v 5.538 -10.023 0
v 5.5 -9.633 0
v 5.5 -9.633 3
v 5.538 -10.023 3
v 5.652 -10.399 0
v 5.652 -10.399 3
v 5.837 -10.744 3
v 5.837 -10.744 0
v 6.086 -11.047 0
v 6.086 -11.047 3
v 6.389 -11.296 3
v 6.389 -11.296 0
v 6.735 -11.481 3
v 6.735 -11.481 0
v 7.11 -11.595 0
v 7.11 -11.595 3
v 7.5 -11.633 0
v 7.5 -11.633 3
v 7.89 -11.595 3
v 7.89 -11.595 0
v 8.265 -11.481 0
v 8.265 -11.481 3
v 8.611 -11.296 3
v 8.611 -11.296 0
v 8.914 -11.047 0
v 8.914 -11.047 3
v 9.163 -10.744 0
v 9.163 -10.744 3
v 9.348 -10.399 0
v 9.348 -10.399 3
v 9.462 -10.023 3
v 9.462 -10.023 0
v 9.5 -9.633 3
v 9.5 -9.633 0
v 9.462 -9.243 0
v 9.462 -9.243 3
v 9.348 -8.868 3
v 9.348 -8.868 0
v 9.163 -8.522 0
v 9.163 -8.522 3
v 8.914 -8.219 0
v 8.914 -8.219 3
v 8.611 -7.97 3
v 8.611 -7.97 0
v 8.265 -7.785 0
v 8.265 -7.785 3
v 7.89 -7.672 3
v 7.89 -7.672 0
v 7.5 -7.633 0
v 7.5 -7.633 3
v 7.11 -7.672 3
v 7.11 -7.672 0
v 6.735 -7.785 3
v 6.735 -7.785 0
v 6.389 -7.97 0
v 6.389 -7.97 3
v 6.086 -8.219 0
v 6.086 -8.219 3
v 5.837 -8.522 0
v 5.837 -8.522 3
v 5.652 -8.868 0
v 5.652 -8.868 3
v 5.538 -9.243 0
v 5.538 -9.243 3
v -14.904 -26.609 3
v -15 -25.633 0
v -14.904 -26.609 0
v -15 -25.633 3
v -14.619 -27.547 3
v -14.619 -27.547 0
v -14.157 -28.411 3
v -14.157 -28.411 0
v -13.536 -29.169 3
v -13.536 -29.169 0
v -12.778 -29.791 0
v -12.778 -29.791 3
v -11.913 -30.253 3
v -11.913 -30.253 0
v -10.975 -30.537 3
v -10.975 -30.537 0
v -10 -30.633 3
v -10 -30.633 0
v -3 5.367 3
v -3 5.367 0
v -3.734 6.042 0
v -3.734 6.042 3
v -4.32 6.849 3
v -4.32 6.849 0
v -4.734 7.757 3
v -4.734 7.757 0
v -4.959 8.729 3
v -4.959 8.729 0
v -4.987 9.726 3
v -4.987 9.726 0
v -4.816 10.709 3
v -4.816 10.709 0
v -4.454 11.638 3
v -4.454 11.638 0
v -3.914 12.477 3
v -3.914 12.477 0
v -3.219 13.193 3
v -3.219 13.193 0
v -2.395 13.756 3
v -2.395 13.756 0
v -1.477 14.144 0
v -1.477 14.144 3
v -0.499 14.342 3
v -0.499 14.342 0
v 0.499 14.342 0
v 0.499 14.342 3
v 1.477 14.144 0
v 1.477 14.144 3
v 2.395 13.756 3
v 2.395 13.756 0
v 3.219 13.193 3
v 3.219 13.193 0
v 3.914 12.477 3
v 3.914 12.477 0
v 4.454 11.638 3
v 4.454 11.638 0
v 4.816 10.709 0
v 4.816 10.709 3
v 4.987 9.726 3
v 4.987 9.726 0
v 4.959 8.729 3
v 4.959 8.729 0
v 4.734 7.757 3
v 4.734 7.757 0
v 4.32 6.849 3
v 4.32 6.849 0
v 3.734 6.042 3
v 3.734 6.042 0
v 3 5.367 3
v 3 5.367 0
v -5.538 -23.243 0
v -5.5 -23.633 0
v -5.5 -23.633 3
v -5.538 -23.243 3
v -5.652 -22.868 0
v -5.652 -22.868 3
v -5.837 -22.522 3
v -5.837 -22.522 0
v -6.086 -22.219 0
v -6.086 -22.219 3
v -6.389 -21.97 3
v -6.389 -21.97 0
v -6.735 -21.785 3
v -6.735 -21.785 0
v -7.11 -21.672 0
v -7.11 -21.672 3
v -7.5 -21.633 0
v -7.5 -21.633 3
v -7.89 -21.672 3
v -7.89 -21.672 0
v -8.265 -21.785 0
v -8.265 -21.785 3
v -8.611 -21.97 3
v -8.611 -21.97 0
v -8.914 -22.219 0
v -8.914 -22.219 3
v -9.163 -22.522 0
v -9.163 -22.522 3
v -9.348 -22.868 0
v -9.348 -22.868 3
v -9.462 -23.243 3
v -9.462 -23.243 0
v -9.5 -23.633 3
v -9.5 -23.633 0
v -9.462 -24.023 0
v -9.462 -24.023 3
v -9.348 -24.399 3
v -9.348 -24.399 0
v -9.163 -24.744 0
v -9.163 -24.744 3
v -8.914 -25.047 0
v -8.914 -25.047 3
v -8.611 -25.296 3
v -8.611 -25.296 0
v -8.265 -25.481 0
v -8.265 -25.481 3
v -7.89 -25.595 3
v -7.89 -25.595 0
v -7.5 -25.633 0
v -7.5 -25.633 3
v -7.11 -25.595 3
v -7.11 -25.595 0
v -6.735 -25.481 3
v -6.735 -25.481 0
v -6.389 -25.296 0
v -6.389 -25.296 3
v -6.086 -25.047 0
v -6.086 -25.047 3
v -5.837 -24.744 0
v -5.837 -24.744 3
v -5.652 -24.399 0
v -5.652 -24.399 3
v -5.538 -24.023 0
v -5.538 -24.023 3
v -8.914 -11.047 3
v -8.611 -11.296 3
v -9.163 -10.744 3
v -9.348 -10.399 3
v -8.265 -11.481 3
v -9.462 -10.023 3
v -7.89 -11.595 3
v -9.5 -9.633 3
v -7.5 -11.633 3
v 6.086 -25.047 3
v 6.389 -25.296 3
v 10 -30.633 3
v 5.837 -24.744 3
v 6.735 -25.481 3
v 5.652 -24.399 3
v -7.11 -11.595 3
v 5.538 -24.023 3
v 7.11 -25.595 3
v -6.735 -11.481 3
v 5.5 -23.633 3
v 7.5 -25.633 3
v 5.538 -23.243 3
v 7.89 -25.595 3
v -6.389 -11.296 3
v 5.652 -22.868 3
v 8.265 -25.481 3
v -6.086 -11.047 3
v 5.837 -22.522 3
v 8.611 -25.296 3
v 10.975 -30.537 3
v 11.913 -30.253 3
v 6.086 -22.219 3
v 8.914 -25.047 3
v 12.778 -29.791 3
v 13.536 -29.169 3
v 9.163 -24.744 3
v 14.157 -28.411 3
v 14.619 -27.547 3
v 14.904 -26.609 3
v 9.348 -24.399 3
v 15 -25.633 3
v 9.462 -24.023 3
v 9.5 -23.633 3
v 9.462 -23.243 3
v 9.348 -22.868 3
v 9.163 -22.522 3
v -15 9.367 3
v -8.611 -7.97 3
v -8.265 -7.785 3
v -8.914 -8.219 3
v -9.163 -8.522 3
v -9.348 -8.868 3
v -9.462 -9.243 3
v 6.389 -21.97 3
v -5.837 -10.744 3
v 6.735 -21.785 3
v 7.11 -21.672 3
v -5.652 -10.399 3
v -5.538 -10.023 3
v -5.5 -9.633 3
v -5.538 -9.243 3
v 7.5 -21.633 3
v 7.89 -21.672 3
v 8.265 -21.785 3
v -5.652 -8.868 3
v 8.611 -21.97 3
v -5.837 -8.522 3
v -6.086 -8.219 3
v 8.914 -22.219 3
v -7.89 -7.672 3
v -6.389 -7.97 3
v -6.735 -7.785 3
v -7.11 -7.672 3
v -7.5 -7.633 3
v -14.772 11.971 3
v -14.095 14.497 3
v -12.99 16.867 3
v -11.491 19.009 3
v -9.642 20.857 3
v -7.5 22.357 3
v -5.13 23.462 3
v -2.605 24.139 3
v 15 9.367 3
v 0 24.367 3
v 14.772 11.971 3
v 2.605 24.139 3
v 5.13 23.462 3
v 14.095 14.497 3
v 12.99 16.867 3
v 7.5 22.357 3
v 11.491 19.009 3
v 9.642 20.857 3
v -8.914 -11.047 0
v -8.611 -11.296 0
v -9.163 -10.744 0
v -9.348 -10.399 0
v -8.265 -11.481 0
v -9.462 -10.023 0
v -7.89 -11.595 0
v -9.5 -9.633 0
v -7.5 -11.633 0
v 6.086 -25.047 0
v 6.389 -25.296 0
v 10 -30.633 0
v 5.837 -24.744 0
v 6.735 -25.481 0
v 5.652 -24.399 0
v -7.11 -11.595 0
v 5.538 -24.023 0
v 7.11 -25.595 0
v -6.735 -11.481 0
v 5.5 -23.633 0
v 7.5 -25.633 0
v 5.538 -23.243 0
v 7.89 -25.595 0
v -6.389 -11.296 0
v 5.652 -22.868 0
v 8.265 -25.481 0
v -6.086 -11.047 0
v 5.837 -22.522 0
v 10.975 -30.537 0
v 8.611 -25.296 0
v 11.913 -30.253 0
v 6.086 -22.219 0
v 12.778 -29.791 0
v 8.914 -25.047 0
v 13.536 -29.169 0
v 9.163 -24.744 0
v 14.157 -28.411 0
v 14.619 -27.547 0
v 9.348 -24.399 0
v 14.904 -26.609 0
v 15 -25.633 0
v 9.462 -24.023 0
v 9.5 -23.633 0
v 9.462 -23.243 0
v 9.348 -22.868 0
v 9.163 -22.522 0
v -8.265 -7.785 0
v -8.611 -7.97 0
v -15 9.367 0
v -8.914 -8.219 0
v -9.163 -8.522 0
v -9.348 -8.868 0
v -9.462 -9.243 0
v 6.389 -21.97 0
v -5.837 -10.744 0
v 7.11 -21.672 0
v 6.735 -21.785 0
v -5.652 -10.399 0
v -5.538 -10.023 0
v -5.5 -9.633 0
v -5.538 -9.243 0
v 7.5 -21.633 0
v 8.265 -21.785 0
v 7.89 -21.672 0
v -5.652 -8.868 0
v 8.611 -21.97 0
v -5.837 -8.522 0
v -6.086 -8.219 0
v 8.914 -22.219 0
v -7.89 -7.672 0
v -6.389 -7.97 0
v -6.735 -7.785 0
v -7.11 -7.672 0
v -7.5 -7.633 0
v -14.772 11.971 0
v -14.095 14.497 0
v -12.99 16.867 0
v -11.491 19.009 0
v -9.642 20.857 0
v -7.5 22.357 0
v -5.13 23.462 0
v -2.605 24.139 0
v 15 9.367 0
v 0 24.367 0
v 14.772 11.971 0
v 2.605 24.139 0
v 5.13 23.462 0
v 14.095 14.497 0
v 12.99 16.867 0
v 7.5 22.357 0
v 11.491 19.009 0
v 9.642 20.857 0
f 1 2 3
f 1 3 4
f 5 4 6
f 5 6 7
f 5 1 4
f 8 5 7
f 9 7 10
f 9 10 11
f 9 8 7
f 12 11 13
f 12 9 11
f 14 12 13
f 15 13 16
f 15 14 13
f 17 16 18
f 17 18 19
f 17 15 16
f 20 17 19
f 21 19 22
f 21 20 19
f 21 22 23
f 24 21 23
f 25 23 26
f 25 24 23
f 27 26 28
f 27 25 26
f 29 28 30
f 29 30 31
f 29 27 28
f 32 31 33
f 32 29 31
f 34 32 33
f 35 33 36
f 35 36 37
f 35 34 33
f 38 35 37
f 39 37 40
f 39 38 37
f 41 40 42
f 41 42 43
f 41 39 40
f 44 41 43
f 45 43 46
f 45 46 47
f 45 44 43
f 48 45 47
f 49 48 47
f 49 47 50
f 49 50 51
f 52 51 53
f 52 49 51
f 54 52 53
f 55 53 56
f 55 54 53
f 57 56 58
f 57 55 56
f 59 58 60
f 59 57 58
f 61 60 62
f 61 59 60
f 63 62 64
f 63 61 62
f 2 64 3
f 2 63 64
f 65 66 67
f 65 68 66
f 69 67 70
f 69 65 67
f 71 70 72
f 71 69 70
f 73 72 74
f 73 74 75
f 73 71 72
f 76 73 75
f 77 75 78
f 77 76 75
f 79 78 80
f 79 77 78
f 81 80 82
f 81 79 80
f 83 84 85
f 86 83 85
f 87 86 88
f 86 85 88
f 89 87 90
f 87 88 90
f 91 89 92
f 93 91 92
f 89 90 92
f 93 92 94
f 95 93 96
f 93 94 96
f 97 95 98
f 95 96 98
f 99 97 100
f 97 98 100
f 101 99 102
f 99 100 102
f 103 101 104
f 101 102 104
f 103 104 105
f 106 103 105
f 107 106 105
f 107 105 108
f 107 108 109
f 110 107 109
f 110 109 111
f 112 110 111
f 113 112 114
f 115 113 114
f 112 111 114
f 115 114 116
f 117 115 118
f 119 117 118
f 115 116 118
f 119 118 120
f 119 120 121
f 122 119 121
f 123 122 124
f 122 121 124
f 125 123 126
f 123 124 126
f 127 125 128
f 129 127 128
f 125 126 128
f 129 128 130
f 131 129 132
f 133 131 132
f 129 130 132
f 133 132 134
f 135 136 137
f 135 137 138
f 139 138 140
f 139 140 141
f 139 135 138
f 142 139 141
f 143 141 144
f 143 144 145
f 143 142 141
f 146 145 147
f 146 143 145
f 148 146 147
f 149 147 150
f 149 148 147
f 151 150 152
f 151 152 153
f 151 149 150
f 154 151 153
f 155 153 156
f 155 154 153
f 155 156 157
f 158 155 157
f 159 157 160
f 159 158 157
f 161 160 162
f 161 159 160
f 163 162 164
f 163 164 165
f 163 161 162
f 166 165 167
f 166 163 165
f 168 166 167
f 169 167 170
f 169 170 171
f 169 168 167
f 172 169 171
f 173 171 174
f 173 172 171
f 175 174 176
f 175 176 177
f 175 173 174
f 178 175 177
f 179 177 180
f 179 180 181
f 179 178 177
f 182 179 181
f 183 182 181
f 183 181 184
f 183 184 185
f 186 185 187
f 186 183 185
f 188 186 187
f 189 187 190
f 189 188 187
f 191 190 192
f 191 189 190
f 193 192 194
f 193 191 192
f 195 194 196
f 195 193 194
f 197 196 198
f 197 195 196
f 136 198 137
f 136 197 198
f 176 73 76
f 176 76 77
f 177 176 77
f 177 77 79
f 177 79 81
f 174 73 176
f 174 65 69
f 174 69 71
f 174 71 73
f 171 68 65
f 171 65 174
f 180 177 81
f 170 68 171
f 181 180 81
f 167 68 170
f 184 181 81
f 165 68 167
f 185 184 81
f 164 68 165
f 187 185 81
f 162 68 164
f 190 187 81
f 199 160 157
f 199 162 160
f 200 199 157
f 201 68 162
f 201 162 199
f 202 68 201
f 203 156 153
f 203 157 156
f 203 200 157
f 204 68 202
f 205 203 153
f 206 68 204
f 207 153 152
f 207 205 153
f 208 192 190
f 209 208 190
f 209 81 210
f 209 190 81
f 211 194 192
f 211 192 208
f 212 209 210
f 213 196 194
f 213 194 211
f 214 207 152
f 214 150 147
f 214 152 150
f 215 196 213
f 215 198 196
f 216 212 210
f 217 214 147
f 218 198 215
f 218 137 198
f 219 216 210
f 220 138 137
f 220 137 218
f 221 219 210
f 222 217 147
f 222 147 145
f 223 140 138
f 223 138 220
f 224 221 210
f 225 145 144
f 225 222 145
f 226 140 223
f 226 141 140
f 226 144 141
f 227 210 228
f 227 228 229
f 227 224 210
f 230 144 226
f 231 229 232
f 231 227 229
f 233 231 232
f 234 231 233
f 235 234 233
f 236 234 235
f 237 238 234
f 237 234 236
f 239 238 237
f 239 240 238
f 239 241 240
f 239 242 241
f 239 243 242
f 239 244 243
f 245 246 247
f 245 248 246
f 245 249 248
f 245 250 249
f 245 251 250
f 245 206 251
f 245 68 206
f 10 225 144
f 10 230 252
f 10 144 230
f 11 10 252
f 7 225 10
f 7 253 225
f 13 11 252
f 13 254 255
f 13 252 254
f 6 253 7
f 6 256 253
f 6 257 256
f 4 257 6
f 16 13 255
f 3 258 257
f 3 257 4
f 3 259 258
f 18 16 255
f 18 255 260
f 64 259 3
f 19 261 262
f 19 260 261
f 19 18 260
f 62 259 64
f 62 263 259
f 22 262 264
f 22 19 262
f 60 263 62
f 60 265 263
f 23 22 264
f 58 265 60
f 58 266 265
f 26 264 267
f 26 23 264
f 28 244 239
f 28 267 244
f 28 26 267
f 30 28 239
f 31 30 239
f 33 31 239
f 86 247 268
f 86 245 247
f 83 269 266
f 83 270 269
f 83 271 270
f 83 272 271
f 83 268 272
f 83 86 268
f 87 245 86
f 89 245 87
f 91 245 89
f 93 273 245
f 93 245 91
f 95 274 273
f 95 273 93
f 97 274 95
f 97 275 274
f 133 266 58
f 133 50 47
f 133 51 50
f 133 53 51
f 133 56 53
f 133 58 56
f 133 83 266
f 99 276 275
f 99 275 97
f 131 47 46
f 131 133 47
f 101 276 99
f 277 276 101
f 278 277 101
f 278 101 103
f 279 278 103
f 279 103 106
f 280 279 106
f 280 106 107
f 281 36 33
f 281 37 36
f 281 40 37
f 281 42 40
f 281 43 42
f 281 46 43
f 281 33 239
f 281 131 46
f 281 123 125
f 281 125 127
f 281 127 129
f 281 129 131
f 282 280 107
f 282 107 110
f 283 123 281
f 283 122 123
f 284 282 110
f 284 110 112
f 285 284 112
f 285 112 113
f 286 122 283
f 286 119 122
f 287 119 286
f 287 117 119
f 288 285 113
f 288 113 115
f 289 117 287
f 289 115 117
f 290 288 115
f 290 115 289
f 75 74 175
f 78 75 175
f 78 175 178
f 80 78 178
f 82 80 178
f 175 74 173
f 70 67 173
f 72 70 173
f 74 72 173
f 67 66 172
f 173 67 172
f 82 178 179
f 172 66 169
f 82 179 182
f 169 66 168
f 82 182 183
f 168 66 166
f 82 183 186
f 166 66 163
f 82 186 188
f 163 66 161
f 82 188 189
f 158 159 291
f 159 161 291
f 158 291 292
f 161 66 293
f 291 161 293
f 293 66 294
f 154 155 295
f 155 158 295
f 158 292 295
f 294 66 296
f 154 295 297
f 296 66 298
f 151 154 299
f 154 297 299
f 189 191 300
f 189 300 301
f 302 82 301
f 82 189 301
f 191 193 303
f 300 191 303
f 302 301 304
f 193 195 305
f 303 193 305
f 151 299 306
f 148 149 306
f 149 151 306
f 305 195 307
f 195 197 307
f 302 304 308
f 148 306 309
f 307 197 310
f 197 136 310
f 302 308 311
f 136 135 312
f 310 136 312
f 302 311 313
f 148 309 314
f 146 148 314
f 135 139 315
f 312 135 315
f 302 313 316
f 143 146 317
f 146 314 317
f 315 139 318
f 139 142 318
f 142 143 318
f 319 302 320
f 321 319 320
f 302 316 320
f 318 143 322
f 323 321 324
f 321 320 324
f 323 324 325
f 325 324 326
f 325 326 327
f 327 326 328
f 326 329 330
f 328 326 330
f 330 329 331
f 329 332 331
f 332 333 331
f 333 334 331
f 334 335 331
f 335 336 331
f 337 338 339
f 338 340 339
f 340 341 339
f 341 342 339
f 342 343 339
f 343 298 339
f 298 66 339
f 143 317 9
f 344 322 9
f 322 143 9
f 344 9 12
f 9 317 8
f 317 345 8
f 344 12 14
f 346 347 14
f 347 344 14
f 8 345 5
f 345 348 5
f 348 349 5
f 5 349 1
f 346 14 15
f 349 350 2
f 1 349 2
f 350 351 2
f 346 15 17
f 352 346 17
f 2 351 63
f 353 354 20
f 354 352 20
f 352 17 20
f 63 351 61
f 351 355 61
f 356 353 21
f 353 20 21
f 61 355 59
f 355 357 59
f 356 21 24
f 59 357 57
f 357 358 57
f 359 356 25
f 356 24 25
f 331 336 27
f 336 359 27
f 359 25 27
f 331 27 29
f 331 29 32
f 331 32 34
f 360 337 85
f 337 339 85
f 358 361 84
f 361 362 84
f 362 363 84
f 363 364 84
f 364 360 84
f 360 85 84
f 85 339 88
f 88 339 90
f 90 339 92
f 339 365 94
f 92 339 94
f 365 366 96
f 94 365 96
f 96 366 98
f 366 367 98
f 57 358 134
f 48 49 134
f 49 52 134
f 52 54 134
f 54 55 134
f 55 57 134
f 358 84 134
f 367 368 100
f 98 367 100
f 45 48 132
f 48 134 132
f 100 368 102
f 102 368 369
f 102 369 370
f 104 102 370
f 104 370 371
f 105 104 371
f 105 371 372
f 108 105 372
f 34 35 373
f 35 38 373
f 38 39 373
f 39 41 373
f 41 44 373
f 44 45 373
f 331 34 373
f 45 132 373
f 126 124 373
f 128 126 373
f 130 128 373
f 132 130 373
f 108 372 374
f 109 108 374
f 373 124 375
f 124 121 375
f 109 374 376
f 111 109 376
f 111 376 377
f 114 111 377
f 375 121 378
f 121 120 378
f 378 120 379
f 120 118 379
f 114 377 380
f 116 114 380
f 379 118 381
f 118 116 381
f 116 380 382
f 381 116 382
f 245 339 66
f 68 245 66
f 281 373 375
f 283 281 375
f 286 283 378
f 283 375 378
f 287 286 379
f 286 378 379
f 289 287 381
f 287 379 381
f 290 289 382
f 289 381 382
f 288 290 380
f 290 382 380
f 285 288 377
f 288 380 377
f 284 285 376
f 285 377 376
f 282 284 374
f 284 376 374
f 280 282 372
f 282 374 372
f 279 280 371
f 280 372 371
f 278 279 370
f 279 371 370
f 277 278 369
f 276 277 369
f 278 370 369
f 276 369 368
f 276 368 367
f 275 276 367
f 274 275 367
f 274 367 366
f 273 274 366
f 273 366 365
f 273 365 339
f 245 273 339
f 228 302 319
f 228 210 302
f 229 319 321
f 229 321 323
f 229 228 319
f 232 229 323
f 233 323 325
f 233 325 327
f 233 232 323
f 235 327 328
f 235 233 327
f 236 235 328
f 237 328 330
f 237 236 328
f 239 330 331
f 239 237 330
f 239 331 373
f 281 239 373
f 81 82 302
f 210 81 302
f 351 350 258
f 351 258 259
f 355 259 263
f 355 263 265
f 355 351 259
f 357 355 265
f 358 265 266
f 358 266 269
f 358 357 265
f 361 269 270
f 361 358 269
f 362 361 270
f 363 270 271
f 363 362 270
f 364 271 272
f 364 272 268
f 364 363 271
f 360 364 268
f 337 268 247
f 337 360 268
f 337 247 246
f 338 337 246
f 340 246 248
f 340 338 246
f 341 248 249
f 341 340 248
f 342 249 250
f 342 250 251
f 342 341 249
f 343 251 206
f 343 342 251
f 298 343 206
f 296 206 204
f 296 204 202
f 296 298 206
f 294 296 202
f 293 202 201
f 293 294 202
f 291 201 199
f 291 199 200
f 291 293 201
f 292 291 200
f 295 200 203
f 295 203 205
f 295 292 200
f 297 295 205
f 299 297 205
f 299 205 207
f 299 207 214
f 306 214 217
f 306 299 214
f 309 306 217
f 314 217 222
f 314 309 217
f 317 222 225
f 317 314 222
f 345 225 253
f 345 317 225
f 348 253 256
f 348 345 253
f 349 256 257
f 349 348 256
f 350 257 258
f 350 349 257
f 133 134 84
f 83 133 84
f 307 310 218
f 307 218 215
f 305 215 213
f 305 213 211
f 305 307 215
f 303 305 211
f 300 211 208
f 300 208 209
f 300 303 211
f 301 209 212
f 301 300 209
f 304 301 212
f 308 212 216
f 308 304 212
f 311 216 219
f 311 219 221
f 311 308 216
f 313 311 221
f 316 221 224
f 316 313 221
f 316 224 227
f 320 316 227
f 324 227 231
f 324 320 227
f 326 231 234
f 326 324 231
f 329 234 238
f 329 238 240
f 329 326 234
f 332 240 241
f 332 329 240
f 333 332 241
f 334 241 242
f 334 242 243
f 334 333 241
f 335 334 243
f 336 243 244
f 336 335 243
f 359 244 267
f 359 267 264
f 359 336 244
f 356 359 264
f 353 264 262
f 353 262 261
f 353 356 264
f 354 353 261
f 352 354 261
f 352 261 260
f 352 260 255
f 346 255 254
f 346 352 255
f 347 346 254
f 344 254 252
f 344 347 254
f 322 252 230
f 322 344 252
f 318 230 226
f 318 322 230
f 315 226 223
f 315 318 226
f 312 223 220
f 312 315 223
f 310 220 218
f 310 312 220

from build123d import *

# Parameters (mm, degrees)
SKETCH_1_R      = 2
EXTRUDE_1_DEPTH = 3
FILLET_1_R      = 5


with BuildPart() as part:
    # 草图1 → 凸台-拉伸1 (new body)
    with BuildSketch(Plane.XY):
        with BuildLine():
            Line((-15, 9.366750419), (-15, -30.633249581))
            Line((-15, -30.633249581), (15, -30.633249581))
            Line((15, -30.633249581), (15, 9.366750419))
            ThreePointArc((15, 9.366750419), (0, 24.366750419), (-15, 9.366750419))
        make_face()
        with Locations((-7.5, -9.633249581)):
            Circle(SKETCH_1_R, mode=Mode.SUBTRACT)
        with Locations((-7.5, -23.633249581)):
            Circle(SKETCH_1_R, mode=Mode.SUBTRACT)
        with Locations(Location((7.5, -23.633249581, 0), (0, 0, 180))):
            Circle(SKETCH_1_R, mode=Mode.SUBTRACT)
        with Locations(Location((7.5, -9.633249581, 0), (0, 0, 180))):
            Circle(SKETCH_1_R, mode=Mode.SUBTRACT)
        with BuildLine():
            Line((3, 5.366750419), (-3, 5.366750419))
            ThreePointArc((-3, 5.366750419), (0, 14.366750419), (3, 5.366750419))
        make_face(mode=Mode.SUBTRACT)
    extrude(amount=EXTRUDE_1_DEPTH)

    # 圆角1
    fillet_1_edges = [part.edges().sort_by_distance(p)[0] for p in [
        (15, -30.633249581, 1.5),
        (-15, -30.633249581, 1.5),
    ]]
    fillet(fillet_1_edges, radius=FILLET_1_R)


solid = part.part
